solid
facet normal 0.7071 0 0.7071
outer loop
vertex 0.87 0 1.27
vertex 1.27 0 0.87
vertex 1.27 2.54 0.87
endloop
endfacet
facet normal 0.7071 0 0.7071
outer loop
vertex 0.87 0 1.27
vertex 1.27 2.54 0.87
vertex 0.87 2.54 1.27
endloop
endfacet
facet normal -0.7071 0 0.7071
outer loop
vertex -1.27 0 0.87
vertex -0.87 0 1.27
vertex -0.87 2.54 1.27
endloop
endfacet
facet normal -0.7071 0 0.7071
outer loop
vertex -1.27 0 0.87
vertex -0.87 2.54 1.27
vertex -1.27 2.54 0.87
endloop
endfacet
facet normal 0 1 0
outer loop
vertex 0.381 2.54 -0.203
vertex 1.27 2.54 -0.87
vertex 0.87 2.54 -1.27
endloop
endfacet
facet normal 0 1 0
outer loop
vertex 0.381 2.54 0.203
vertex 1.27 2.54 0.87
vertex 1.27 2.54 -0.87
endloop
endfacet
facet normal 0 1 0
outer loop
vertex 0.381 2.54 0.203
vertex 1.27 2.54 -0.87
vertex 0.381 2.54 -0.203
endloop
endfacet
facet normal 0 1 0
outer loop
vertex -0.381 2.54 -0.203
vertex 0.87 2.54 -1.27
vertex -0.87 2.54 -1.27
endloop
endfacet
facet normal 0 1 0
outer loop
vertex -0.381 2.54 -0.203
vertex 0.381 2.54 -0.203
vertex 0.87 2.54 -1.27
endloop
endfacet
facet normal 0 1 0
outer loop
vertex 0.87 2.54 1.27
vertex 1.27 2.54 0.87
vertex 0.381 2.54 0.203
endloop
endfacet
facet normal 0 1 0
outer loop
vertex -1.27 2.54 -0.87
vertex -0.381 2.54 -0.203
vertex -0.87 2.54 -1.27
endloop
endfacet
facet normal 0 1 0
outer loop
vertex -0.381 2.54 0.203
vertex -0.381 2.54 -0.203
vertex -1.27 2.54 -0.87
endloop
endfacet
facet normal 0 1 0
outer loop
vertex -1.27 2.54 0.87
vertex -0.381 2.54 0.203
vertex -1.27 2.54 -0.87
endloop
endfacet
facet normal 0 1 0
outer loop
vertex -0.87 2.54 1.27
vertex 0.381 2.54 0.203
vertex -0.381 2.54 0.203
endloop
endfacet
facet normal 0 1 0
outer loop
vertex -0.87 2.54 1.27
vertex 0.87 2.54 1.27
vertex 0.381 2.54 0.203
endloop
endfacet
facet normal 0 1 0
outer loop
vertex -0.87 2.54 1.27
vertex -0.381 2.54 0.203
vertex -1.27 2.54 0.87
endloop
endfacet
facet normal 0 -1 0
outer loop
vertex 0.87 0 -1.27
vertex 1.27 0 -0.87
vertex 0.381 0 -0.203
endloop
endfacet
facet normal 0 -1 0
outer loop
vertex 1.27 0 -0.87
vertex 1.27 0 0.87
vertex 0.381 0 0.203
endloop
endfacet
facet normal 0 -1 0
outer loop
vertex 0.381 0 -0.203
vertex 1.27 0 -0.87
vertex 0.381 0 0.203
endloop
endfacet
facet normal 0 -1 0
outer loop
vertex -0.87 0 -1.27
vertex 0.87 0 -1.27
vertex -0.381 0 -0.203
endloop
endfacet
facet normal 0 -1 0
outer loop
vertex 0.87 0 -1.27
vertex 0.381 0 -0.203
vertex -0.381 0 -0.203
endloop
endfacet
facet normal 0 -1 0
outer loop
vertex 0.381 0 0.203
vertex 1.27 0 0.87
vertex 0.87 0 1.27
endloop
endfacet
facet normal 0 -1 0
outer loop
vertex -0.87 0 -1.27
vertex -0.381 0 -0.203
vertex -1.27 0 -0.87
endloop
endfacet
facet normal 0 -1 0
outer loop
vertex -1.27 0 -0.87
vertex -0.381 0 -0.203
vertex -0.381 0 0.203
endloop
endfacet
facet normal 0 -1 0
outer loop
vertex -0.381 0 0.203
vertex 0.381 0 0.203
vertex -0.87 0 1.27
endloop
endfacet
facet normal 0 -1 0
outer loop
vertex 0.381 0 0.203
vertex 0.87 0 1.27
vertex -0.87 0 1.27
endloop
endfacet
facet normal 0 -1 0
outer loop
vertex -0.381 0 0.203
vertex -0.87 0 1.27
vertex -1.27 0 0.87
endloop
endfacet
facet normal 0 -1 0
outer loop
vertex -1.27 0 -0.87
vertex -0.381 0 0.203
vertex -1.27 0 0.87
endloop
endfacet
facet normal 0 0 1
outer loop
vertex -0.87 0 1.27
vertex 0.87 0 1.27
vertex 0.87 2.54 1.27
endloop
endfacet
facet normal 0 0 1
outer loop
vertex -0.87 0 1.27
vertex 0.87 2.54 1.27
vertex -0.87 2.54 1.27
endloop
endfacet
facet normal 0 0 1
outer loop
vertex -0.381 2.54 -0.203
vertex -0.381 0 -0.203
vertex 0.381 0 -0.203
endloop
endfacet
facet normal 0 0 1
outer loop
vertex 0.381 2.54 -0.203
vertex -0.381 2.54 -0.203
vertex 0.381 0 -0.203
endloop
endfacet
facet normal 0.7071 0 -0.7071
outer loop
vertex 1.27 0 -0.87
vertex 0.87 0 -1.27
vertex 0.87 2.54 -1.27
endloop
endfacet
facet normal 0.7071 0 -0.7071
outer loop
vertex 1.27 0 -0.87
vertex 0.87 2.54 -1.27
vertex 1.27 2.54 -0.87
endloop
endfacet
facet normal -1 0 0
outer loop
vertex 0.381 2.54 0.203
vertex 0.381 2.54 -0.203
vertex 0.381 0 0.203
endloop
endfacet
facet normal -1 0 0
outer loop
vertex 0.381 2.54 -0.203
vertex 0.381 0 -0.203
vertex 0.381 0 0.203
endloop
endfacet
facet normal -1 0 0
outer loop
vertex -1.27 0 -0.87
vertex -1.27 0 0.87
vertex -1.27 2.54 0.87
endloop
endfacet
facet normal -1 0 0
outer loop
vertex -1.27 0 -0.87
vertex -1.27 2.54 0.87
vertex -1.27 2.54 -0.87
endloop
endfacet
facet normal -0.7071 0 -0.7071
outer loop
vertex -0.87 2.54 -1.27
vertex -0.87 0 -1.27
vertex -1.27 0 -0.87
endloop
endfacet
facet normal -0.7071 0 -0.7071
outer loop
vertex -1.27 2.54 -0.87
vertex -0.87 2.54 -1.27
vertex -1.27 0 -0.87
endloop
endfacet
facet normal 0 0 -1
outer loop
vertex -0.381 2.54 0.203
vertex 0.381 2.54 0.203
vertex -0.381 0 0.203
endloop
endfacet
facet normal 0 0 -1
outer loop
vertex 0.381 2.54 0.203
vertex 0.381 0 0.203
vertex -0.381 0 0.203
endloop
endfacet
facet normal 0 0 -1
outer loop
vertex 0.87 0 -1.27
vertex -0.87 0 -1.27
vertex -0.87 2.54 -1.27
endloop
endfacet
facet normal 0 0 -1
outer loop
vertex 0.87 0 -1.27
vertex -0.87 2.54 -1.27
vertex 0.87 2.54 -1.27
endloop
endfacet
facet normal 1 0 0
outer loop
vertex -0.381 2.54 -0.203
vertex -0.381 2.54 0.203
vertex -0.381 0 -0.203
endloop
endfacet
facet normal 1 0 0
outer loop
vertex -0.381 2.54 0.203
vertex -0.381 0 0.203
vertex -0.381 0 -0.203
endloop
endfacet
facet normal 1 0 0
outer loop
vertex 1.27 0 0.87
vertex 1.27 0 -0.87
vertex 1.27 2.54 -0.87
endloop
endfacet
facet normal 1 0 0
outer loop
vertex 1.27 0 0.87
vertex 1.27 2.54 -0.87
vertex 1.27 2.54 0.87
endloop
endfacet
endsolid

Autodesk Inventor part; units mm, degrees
ref_plane "YZ Plane" through (0, 0, 0) normal (1, 0, 0) x (0, 1, 0)
ref_plane "XZ Plane" through (0, 0, 0) normal (0, 1, 0) x (-1, 0, 0)
ref_plane "XY Plane" through (0, 0, 0) normal (0, 0, 1) x (1, 0, 0)
sketch "Sketch1" plane through (0, 0, 0) normal (0, 1, 0) x (-1, 0, 0)
  line L0 (0.87, -1.27) -> (-0.87, -1.27)
  line L1 (-1.27, -0.87) -> (-1.27, 0.87)
  line L2 (-0.87, 1.27) -> (0.87, 1.27)
  line L3 (1.27, 0.87) -> (1.27, -0.87)
  line L4 (1.27, -1.27) -> (-1.27, 1.27) construction
  line L5 (-1.27, -1.27) -> (1.27, 1.27) construction
  line L6 (0.381, -0.203) -> (-0.381, -0.203)
  line L7 (-0.381, -0.203) -> (-0.381, 0.203)
  line L8 (-0.381, 0.203) -> (0.381, 0.203)
  line L9 (0.381, 0.203) -> (0.381, -0.203)
  line L10 (0.381, -0.203) -> (-0.381, 0.203) construction
  line L11 (-0.381, -0.203) -> (0.381, 0.203) construction
  line L12 (0.87, -1.27) -> (1.27, -0.87)
  line L13 (-0.87, -1.27) -> (-1.27, -0.87)
  line L14 (-1.27, 0.87) -> (-0.87, 1.27)
  line L15 (0.87, 1.27) -> (1.27, 0.87)
  point P0 (0, 0)
  dimension "d0" = 2.54
  dimension "d1" = 2.54
  dimension "d2" = 0.406
  dimension "d3" = 0.762
  dimension "d4" = 0.4
  dimension "d5" = 0.4
  dimension "d6" = 0.4
  dimension "d7" = 0.4
  dimension "d8" = 0.4
  dimension "d9" = 0.4
  dimension "d10" = 0.4
  dimension "d11" = 0.4
extrude "Extrusion1" add sketch "Sketch1" along normal blind 2.54
equation "\"d5\" = d4"
equation "\"d6\" = d4"
equation "\"d7\" = d6"
equation "\"d8\" = d4"
equation "\"d9\" = d8"
equation "\"d10\" = d4"
equation "\"d11\" = d10"
properties part number "Holder" material "ABS Plastic"
